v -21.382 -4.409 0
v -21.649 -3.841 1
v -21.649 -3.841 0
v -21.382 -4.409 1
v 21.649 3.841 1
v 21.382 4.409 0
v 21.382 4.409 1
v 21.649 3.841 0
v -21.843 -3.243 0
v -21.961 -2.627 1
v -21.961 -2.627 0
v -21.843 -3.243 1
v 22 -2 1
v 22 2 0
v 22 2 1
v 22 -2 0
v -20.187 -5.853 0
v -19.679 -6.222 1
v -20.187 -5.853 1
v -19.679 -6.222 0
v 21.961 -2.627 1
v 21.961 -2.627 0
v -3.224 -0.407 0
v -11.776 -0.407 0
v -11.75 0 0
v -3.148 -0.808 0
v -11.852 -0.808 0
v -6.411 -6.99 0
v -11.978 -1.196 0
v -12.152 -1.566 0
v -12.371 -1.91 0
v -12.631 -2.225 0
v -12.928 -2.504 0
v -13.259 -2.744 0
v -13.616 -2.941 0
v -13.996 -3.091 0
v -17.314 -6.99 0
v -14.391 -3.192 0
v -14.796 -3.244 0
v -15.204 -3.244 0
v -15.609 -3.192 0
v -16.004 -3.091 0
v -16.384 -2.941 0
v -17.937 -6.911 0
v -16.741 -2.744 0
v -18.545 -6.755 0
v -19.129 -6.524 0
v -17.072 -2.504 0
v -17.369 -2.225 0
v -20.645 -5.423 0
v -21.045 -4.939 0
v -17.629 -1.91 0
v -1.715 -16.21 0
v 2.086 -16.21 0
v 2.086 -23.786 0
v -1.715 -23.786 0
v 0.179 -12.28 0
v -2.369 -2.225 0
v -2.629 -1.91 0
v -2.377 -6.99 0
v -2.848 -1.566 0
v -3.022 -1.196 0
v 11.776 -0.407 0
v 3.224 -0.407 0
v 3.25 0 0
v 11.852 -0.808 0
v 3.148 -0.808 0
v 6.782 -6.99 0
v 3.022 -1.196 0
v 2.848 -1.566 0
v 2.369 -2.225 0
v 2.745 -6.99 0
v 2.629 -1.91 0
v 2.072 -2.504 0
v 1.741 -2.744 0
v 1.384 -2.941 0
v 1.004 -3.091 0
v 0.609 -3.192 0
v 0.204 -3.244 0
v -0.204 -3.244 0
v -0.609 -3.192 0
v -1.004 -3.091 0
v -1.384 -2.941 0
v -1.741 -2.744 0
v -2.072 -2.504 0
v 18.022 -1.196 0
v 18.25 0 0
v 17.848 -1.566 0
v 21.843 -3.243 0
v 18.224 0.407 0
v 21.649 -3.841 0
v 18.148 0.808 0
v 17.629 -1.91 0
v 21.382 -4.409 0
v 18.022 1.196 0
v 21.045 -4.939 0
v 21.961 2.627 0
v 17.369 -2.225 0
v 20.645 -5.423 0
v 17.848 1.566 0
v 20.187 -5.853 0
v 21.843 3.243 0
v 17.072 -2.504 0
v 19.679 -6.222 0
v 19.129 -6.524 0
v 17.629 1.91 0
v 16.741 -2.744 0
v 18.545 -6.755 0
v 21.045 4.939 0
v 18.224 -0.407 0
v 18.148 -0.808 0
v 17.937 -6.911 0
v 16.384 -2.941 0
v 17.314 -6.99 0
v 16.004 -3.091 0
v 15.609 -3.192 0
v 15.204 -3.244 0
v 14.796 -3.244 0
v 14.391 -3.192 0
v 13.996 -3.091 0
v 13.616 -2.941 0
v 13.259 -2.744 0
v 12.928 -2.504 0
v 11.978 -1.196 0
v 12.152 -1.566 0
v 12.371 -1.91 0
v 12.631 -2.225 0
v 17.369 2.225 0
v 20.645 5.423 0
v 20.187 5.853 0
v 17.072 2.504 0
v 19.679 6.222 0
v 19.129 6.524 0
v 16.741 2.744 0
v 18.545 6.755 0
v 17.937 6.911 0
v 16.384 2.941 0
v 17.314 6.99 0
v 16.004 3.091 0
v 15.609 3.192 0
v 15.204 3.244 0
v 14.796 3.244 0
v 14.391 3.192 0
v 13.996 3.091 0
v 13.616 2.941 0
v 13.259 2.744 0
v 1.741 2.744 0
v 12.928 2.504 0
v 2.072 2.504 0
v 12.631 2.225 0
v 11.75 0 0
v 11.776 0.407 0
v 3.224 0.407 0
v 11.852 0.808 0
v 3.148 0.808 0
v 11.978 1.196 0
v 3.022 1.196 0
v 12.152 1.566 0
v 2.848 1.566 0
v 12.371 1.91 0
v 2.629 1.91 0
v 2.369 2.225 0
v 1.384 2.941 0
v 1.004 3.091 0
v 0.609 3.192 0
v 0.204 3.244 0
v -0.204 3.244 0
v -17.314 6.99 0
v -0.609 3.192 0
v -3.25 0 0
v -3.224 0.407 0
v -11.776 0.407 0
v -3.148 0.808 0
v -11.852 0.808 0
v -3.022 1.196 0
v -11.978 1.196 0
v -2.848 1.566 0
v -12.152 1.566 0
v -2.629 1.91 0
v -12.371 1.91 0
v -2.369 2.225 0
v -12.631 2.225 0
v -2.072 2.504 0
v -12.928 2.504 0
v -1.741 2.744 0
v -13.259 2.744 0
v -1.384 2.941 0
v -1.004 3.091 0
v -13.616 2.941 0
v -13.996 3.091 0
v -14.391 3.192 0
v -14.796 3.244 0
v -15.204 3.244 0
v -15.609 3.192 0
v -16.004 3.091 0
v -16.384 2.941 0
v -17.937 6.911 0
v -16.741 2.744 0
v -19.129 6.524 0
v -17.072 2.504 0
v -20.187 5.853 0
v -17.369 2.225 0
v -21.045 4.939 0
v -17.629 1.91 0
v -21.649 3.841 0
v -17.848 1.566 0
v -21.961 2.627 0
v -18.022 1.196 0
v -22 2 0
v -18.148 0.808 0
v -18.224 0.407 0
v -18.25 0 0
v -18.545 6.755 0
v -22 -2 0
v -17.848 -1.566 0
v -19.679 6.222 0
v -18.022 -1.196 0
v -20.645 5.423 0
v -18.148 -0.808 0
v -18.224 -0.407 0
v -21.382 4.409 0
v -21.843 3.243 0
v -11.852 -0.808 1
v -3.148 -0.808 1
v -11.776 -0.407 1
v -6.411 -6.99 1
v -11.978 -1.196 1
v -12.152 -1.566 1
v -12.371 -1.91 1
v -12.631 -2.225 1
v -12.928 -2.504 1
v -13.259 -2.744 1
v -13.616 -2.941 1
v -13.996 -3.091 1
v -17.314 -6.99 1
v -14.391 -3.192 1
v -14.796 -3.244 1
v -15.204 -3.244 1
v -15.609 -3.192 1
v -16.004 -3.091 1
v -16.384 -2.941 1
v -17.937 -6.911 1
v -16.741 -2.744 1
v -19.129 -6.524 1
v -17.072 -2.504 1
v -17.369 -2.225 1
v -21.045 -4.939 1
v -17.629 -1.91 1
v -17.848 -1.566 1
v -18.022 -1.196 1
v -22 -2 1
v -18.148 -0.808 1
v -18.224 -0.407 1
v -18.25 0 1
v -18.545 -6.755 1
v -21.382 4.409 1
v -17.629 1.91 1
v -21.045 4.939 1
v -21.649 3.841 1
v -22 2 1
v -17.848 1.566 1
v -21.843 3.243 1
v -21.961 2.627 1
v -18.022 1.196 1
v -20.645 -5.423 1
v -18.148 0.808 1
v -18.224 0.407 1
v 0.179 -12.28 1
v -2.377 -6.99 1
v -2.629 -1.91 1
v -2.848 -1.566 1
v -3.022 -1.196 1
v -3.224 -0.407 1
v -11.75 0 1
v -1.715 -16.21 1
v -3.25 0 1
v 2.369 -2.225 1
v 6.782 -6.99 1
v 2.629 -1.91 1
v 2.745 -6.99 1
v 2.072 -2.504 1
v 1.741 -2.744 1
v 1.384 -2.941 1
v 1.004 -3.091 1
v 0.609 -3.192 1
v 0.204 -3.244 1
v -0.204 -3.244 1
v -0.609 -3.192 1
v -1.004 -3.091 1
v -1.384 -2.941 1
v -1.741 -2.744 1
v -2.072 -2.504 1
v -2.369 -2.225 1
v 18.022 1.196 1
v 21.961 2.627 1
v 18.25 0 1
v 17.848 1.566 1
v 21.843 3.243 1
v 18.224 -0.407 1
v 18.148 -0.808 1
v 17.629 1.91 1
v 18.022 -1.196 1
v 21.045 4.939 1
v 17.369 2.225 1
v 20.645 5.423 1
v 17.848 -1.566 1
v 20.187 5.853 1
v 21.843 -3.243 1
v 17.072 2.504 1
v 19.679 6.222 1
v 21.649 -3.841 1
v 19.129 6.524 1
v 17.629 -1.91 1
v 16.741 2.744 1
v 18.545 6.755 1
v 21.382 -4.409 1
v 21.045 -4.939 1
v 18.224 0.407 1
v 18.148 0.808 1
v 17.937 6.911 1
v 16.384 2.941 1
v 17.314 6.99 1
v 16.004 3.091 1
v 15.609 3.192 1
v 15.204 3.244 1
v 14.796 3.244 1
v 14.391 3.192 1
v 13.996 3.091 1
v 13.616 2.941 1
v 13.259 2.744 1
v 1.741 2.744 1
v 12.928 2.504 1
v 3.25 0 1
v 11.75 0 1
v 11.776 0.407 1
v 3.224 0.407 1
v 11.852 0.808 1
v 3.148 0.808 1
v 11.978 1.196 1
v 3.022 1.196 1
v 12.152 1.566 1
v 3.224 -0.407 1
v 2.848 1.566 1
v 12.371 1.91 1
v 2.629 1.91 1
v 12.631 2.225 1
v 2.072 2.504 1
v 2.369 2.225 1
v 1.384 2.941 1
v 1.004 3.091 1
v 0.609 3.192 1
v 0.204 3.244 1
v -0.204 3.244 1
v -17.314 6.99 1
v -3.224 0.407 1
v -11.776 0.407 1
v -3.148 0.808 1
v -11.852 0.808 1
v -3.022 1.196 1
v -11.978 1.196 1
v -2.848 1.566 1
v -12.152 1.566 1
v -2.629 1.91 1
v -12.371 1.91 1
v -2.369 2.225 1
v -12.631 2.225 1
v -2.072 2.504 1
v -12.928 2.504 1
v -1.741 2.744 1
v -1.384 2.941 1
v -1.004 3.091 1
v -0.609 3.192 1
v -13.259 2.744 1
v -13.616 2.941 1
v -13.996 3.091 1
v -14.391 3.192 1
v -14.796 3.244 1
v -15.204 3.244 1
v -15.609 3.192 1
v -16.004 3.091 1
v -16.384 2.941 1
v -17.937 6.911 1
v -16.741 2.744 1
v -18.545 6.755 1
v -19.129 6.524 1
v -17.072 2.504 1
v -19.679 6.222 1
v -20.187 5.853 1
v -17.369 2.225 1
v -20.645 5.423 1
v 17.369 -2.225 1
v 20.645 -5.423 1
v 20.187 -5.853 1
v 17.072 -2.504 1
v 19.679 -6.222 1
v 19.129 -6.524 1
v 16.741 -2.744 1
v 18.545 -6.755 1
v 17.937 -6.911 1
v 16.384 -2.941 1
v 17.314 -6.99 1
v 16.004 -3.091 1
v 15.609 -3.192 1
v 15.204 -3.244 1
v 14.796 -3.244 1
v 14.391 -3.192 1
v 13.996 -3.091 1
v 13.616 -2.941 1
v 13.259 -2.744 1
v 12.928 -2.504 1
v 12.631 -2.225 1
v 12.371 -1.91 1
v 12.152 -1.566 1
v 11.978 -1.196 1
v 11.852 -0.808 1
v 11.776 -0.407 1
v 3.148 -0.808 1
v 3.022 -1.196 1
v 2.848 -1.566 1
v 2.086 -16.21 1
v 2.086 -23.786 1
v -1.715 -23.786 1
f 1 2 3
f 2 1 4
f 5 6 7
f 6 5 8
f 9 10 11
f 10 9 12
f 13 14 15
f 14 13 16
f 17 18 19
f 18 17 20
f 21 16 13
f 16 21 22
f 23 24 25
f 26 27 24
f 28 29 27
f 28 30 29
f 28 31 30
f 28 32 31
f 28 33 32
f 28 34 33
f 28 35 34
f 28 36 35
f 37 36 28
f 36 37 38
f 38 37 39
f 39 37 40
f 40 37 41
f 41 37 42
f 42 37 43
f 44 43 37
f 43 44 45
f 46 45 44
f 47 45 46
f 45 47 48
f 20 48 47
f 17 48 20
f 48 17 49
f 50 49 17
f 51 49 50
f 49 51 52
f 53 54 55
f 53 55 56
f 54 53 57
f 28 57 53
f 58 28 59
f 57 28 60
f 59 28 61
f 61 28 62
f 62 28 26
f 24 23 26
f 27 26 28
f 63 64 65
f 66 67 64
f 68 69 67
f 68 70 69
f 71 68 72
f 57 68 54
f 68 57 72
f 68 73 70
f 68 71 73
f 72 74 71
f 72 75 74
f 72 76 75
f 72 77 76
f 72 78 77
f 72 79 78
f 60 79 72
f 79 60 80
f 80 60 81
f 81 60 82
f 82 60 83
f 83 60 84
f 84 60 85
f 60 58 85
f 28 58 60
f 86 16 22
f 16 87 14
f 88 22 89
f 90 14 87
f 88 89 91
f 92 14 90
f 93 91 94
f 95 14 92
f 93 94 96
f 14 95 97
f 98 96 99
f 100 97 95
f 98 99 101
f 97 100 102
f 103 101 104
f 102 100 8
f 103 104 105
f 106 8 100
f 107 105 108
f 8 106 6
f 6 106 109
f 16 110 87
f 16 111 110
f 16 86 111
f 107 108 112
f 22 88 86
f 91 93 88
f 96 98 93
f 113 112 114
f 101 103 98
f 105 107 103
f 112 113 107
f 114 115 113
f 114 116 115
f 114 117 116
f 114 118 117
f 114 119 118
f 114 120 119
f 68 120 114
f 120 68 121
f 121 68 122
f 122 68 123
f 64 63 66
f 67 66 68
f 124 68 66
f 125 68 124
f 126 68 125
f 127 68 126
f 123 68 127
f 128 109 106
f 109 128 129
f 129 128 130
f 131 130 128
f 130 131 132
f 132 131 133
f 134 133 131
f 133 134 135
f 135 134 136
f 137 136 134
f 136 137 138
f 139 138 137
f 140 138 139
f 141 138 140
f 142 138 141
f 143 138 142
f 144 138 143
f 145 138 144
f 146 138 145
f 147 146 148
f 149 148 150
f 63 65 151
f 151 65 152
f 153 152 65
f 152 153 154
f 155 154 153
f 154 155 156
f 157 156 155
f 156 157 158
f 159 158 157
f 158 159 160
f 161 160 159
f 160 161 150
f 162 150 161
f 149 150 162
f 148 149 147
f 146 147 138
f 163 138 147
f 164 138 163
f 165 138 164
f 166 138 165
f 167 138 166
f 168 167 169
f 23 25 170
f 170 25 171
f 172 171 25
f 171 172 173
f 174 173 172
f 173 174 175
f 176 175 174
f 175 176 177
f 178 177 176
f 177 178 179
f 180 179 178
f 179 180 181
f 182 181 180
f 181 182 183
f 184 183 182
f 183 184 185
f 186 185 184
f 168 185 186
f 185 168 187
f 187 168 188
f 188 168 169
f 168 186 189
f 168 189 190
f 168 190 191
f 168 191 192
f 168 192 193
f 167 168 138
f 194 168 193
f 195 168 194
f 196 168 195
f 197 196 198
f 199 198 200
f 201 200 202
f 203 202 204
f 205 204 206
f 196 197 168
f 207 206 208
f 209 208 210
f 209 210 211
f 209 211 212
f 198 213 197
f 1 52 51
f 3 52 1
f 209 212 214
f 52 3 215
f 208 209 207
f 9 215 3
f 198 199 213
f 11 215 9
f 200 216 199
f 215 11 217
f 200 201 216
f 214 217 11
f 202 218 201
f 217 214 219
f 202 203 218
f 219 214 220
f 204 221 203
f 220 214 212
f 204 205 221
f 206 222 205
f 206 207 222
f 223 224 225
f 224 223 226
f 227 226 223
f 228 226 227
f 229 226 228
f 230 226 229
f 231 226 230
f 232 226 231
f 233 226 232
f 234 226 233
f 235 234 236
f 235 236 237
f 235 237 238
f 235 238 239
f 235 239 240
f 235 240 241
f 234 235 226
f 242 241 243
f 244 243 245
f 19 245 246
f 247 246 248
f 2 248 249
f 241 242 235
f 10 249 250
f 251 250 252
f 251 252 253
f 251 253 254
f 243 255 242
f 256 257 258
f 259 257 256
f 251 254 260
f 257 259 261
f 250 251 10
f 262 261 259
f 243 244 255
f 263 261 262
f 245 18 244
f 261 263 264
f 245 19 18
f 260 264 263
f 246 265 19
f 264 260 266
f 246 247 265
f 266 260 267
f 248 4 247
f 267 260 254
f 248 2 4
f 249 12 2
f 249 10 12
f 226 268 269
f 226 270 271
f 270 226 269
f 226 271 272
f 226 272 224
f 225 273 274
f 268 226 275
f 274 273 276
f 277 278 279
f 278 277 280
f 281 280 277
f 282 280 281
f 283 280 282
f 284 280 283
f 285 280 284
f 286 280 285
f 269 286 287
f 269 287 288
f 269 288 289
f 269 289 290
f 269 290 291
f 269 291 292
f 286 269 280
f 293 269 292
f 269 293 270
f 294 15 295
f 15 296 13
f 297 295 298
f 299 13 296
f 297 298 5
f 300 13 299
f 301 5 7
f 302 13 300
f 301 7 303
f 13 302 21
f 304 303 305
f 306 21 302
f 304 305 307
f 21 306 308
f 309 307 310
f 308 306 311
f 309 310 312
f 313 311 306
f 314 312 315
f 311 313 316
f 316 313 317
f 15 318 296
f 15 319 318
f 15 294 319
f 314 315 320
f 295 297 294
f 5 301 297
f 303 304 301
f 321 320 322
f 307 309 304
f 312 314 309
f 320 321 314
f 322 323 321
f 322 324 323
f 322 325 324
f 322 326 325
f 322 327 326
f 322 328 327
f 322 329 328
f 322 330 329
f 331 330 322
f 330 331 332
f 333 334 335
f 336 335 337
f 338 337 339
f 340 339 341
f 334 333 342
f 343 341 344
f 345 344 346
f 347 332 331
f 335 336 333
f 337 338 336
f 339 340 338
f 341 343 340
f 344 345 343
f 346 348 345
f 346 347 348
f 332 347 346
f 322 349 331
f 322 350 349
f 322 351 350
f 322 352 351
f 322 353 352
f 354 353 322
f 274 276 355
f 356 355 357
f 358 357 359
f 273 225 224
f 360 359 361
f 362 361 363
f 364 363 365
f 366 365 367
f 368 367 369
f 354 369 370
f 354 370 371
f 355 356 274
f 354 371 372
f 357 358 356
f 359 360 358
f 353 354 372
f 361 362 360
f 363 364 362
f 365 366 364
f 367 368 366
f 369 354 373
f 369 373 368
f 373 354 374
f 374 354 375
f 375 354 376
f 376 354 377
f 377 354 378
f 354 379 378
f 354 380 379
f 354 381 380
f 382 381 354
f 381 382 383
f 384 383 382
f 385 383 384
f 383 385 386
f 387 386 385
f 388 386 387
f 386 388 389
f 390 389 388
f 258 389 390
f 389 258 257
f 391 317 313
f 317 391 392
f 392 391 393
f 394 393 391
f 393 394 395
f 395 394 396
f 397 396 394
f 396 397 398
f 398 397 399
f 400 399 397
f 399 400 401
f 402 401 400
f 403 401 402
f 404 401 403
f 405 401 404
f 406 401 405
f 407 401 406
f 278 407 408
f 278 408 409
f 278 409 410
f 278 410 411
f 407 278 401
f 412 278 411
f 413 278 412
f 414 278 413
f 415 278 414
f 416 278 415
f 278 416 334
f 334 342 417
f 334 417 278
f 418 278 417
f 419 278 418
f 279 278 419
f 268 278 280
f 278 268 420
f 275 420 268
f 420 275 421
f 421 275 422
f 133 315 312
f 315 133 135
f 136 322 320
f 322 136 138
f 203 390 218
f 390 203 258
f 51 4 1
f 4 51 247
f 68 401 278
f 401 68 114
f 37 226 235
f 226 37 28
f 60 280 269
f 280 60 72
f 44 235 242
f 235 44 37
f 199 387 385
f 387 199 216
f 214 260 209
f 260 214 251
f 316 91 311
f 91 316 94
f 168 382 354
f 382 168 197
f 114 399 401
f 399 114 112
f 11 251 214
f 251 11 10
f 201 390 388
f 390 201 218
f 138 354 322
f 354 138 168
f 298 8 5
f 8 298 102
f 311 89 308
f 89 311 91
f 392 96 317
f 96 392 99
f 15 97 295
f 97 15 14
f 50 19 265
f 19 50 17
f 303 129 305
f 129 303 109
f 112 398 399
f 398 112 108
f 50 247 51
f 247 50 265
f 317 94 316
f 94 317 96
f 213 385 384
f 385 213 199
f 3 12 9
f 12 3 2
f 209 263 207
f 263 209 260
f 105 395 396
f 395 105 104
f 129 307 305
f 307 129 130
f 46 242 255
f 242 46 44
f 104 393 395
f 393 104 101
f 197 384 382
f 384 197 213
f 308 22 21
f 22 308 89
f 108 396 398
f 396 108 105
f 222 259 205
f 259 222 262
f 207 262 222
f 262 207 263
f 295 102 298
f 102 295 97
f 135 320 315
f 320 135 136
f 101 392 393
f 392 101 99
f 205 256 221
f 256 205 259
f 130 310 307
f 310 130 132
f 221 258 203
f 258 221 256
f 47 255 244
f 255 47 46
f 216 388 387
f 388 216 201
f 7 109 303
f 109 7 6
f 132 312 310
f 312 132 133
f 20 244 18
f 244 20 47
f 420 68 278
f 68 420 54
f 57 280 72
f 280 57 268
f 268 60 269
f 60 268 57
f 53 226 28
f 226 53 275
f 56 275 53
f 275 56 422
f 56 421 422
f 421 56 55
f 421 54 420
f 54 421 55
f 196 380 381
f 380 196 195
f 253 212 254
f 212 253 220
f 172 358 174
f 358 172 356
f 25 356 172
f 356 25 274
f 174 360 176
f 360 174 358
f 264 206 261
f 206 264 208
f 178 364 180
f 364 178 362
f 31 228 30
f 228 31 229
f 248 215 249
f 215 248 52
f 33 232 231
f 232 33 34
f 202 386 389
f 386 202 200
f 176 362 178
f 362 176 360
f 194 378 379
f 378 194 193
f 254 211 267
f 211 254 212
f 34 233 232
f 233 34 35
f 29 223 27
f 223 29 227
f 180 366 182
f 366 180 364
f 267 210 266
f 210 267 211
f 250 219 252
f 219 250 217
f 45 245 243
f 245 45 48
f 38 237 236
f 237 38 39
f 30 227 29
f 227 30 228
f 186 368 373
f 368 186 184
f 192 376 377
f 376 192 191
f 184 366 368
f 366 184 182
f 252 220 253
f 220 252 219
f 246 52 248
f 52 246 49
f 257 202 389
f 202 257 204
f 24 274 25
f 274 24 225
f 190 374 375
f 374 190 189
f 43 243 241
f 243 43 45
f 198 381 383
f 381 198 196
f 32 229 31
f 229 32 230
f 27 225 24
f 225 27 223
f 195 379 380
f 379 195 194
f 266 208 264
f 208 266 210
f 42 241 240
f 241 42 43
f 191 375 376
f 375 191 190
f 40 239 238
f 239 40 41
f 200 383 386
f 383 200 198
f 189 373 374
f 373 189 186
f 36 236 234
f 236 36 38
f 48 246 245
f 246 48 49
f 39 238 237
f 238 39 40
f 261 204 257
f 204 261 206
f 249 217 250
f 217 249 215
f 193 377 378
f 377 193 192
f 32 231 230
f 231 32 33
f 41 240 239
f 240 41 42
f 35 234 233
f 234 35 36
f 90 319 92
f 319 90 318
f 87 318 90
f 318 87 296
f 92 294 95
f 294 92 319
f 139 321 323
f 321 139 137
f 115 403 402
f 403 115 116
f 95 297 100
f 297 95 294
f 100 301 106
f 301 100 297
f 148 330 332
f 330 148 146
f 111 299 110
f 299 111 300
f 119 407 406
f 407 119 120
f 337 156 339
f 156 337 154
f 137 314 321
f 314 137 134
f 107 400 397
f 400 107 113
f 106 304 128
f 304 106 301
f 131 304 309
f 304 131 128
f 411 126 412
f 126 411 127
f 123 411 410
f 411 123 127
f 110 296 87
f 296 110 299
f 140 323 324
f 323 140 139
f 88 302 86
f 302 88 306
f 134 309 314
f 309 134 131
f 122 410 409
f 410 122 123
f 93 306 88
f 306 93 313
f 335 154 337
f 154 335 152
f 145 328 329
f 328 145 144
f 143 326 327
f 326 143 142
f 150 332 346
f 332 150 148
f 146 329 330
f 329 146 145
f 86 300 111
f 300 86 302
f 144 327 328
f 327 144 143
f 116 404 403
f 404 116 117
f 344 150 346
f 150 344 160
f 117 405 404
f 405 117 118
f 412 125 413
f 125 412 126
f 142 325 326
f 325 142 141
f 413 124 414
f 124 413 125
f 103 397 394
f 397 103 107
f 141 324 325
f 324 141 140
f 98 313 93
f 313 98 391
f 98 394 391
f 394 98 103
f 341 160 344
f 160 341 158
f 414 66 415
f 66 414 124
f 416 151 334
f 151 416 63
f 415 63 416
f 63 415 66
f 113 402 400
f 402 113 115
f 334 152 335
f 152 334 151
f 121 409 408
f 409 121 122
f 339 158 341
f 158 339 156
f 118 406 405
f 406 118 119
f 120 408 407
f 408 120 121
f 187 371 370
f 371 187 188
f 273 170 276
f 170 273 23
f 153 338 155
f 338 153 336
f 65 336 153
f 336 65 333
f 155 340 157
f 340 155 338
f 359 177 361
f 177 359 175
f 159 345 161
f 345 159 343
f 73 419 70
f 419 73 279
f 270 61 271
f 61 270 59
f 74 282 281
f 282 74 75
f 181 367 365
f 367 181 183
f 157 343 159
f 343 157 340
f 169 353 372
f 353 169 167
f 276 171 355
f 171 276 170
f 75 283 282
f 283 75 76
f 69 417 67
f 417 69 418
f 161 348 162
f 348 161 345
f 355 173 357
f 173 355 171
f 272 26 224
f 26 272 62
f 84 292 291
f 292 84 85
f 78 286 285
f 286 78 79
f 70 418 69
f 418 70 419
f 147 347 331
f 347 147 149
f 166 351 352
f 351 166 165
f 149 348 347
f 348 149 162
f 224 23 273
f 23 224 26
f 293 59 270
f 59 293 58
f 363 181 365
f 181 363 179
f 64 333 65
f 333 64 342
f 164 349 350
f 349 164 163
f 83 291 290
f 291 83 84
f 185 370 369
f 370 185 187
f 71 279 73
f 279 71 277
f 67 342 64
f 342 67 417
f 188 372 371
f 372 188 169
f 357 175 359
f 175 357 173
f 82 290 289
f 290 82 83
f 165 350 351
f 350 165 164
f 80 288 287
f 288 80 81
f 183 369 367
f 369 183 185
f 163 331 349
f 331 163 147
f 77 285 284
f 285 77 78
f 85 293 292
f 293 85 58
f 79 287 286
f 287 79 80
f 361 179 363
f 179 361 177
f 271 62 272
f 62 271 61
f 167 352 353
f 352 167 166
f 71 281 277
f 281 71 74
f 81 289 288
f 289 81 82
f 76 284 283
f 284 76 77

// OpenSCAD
$fn = 50;


difference() {
	union() {
		translate(v = [0, 0, 0]) {
			rotate(a = [0, 0, 0]) {
				hull() {
					translate(v = [-17.0000000000, 2.0000000000, 0]) {
						rotate(a = [0, 0, 0]) {
							translate(v = [0, 0, 0]) {
								rotate(a = [0, 0, 0]) {
									cylinder(h = 1, r = 5);
								}
							}
						}
					}
					translate(v = [17.0000000000, 2.0000000000, 0]) {
						rotate(a = [0, 0, 0]) {
							translate(v = [0, 0, 0]) {
								rotate(a = [0, 0, 0]) {
									cylinder(h = 1, r = 5);
								}
							}
						}
					}
					translate(v = [-17.0000000000, -2.0000000000, 0]) {
						rotate(a = [0, 0, 0]) {
							translate(v = [0, 0, 0]) {
								rotate(a = [0, 0, 0]) {
									cylinder(h = 1, r = 5);
								}
							}
						}
					}
					translate(v = [17.0000000000, -2.0000000000, 0]) {
						rotate(a = [0, 0, 0]) {
							translate(v = [0, 0, 0]) {
								rotate(a = [0, 0, 0]) {
									cylinder(h = 1, r = 5);
								}
							}
						}
					}
				}
			}
		}
		translate(v = [0, -5, 0]) {
			rotate(a = [0, 0, 0]) {
				linear_extrude(height = 1) {
					text(font = "DejaVu Sans Mono:style=Bold", halign = "center", size = 19.0000000000, text = "Y", valign = "top");
				}
			}
		}
	}
	union() {
		translate(v = [-15.0000000000, 0.0000000000, -125.0000000000]) {
			rotate(a = [0, 0, 0]) {
				cylinder(h = 250, r = 3.2500000000);
			}
		}
		translate(v = [15.0000000000, 0.0000000000, -125.0000000000]) {
			rotate(a = [0, 0, 0]) {
				cylinder(h = 250, r = 3.2500000000);
			}
		}
		translate(v = [15.0000000000, 0.0000000000, -125.0000000000]) {
			rotate(a = [0, 0, 0]) {
				cylinder(h = 250, r = 3.2500000000);
			}
		}
		translate(v = [0, 0, -125.0000000000]) {
			rotate(a = [0, 0, 0]) {
				cylinder(h = 250, r = 3.2500000000);
			}
		}
	}
}
